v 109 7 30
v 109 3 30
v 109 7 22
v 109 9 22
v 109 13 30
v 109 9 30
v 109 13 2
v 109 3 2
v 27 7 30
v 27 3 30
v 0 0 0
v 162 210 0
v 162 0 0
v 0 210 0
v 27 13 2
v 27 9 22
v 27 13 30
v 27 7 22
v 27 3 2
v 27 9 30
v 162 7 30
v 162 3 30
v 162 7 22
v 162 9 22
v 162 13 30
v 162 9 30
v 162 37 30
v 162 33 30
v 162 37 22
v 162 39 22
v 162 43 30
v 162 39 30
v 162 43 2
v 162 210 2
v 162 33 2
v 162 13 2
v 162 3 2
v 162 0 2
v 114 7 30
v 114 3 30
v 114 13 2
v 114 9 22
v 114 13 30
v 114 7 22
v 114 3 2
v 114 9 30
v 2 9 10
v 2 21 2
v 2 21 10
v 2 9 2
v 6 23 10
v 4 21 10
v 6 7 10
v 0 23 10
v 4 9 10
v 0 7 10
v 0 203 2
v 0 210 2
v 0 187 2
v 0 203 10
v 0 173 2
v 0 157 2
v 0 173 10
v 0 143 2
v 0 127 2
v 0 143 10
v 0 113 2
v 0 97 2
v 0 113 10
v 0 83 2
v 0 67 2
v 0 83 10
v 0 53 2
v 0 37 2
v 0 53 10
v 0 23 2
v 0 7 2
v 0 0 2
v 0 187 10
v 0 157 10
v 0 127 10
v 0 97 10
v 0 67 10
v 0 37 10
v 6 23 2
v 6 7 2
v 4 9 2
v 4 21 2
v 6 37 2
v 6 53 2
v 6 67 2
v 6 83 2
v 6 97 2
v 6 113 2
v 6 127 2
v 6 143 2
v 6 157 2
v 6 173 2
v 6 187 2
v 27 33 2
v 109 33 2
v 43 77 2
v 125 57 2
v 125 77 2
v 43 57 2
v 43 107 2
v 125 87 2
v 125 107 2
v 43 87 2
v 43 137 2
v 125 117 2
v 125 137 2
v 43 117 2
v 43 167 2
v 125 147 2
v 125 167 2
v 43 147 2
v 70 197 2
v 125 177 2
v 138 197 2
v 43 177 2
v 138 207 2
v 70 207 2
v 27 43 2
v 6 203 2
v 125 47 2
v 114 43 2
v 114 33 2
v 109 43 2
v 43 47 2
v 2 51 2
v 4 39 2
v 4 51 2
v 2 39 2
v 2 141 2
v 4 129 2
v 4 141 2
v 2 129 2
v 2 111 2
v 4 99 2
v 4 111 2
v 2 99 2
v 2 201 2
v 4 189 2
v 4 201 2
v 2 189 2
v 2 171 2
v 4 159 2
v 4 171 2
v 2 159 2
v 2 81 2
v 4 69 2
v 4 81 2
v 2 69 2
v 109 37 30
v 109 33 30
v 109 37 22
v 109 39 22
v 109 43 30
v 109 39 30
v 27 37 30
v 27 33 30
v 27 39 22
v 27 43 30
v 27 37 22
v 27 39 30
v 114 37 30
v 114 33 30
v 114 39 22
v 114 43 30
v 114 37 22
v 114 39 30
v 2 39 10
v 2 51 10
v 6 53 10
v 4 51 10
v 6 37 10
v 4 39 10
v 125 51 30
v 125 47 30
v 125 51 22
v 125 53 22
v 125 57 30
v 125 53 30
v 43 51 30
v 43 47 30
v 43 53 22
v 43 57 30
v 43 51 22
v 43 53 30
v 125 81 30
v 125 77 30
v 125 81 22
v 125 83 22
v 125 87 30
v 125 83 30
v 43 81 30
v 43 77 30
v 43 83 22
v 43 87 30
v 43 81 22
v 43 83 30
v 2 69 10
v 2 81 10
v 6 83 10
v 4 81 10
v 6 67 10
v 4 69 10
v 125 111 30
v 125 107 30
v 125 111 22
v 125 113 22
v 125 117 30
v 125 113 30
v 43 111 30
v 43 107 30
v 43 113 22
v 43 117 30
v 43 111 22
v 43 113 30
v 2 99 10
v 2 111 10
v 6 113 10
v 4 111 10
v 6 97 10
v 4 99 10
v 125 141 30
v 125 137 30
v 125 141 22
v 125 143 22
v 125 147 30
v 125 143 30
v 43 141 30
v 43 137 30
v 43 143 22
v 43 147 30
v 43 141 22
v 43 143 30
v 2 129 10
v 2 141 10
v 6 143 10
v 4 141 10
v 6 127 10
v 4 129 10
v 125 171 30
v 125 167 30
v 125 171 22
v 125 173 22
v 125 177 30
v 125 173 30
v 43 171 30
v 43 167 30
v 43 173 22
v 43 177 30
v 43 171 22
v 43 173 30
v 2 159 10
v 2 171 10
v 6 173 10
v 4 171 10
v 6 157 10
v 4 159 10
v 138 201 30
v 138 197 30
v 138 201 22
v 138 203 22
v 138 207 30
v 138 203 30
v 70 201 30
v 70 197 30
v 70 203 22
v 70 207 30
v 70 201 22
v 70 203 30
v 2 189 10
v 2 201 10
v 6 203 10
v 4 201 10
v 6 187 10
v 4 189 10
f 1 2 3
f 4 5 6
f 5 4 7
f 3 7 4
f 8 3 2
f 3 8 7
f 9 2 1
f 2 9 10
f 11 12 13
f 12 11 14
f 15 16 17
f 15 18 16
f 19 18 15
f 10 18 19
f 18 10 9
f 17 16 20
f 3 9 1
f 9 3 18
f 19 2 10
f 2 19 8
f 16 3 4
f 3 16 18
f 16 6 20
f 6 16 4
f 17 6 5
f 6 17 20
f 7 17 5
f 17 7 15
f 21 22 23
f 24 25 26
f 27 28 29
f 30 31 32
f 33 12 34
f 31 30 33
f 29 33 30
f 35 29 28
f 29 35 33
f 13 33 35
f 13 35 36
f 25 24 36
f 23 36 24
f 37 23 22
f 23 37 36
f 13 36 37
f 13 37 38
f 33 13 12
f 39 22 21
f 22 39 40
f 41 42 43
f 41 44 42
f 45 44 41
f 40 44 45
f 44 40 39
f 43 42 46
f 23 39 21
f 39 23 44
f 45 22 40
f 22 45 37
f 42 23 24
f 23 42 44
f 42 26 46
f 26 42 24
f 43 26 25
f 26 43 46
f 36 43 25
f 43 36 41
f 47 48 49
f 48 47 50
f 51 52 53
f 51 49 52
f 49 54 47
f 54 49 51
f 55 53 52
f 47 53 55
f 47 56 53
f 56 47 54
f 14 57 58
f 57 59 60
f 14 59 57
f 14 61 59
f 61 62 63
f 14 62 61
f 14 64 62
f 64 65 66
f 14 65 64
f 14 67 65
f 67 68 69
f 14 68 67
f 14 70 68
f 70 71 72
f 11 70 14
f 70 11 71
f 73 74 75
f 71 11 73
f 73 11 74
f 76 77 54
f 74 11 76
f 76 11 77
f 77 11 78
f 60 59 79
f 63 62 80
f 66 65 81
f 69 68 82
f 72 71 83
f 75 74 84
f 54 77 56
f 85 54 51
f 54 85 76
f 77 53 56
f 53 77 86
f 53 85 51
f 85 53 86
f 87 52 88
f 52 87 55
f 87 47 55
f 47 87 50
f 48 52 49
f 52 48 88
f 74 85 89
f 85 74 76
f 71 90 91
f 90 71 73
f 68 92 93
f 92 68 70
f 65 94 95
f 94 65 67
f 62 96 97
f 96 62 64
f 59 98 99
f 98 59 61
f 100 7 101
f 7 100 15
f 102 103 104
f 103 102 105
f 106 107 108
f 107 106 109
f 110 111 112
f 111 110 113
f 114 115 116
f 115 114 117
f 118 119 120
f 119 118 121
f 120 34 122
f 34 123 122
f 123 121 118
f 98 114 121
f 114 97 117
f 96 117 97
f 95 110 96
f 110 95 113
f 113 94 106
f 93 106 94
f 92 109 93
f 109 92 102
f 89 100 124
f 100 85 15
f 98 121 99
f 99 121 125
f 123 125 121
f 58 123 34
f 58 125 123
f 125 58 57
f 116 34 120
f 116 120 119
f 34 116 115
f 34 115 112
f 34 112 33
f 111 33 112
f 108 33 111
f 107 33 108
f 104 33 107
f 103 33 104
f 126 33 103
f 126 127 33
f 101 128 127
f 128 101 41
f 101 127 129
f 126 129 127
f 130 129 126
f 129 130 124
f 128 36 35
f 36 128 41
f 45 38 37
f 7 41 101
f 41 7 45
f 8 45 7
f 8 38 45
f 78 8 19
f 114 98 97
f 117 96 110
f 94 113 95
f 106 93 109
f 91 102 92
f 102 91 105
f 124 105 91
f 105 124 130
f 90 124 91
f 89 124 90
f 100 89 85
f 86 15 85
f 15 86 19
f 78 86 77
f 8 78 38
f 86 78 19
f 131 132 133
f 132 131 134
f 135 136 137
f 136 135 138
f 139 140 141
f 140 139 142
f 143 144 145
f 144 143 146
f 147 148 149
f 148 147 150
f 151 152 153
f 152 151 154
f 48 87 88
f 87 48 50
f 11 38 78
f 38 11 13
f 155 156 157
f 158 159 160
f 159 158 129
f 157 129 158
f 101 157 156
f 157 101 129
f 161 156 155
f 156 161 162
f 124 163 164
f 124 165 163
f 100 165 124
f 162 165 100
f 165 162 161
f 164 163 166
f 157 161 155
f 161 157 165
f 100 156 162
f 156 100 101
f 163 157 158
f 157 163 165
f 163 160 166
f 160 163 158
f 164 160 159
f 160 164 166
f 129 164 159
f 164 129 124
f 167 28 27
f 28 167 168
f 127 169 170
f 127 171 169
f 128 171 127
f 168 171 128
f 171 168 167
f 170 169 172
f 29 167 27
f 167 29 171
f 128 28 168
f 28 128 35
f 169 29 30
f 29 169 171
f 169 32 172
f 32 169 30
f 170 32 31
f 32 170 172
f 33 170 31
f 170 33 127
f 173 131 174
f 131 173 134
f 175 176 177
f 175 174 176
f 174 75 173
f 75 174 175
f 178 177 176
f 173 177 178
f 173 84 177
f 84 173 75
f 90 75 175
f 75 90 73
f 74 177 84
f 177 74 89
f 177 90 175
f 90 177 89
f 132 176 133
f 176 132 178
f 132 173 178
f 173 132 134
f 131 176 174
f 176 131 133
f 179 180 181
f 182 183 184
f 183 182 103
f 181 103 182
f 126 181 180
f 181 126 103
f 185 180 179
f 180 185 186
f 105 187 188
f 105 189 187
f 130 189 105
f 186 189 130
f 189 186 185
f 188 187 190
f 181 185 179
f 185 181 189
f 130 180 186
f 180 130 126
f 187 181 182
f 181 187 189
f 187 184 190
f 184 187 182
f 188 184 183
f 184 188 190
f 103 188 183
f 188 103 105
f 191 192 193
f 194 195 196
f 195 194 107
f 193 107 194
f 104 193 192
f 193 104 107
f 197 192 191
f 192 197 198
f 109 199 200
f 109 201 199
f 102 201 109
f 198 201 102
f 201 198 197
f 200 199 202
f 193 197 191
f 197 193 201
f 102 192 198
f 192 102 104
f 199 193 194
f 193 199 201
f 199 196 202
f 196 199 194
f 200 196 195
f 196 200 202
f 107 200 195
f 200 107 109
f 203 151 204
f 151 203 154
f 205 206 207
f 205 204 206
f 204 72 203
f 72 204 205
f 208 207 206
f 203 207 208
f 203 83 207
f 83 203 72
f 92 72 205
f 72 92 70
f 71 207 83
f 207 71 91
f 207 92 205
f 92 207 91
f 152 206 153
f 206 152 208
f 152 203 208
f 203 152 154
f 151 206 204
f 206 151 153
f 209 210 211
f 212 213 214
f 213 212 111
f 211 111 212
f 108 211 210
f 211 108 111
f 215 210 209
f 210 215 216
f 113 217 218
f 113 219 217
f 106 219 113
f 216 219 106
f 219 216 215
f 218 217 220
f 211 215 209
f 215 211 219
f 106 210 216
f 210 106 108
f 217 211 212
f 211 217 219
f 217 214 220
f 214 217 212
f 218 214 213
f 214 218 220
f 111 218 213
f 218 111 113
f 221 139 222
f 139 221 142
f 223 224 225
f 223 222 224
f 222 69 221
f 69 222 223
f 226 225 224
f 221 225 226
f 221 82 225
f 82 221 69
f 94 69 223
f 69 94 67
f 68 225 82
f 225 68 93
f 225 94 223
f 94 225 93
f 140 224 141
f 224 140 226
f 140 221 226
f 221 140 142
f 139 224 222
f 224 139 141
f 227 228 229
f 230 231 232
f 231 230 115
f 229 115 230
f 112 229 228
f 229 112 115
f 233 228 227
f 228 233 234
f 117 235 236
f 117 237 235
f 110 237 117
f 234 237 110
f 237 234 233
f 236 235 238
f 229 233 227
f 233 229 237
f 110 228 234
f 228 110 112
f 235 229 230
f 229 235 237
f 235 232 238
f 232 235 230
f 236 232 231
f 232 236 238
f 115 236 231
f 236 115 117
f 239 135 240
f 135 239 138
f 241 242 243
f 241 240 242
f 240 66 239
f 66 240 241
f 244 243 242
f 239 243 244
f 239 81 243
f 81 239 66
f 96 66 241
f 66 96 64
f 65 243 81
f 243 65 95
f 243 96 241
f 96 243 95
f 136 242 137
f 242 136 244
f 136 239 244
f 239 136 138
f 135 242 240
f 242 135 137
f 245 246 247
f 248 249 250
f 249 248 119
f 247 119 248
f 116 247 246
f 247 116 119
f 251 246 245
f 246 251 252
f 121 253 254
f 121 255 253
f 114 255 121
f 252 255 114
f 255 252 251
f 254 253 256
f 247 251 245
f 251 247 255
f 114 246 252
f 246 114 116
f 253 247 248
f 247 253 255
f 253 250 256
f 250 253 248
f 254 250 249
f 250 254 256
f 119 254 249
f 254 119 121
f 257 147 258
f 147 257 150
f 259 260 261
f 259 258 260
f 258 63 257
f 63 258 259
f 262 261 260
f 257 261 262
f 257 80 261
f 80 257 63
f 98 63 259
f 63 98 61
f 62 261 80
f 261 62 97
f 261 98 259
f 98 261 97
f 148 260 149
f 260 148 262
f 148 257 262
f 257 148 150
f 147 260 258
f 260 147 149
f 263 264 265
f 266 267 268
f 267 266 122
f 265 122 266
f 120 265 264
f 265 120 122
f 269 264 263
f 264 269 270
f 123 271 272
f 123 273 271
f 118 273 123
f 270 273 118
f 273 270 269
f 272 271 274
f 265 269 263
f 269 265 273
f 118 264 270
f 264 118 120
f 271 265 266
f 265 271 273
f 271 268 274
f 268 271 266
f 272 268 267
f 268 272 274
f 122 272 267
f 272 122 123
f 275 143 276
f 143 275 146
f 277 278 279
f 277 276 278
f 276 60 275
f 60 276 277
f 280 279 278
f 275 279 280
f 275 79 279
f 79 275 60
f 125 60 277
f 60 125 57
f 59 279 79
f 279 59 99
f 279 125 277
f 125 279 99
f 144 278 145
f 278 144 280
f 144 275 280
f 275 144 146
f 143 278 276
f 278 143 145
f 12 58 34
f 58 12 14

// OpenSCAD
// file: ../cardshowcase.scad
module base_tarjeta(desplazamiento, posicion_tarjeta, longitud_tarjeta, altura_borde_tarjeta, altura_interior_tarjeta)
{
    color("purple") translate([ posicion_tarjeta, desplazamiento + 1, 0 ])
        cube([ longitud_tarjeta, 4, altura_borde_tarjeta + 2 ]);

    color("pink") translate([ posicion_tarjeta, desplazamiento + 5, 0 ])
        cube([ longitud_tarjeta, 2, altura_interior_tarjeta + 2 ]);

    color("purple") translate([ posicion_tarjeta, desplazamiento + 7, 0 ])
        cube([ longitud_tarjeta, 4, altura_borde_tarjeta + 2 ]);
}

module base_tarjeta_corta(desplazamiento, posicion_tarjeta, longitud_tarjeta, altura_borde_tarjeta,
                          altura_interior_tarjeta, tab_size)
{
    color("purple") translate([ posicion_tarjeta, desplazamiento + 1, 0 ])
        cube([ tab_size, 4, altura_borde_tarjeta + 2 ]);

    color("pink") translate([ posicion_tarjeta, desplazamiento + 5, 0 ])
        cube([ tab_size, 2, altura_interior_tarjeta + 2 ]);

    color("purple") translate([ posicion_tarjeta, desplazamiento + 7, 0 ])
        cube([ tab_size, 4, altura_borde_tarjeta + 2 ]);

    color("purple") translate([ longitud_tarjeta + posicion_tarjeta - tab_size, desplazamiento + 1, 0 ])
        cube([ tab_size, 4, altura_borde_tarjeta + 2 ]);

    color("pink") translate([ longitud_tarjeta + posicion_tarjeta - tab_size, desplazamiento + 5, 0 ])
        cube([ tab_size, 2, altura_interior_tarjeta + 2 ]);

    color("purple") translate([ longitud_tarjeta + posicion_tarjeta - tab_size, desplazamiento + 7, 0 ])
        cube([ tab_size, 4, altura_borde_tarjeta + 2 ]);
}

module soporte_tarjeta(tipo, size)
{
    if (tipo == "ISA8")
    {
        desplazamiento = 2;
        posicion_tarjeta = 27;
        longitud_tarjeta = 82;
        altura_borde_tarjeta = 28;
        altura_interior_tarjeta = 20;

        if (size == 0)
        {
            base_tarjeta(desplazamiento, posicion_tarjeta, longitud_tarjeta, altura_borde_tarjeta,
                         altura_interior_tarjeta);
        }
        else
        {
            base_tarjeta_corta(desplazamiento, posicion_tarjeta, longitud_tarjeta, altura_borde_tarjeta,
                               altura_interior_tarjeta, size);
        }
    }
    else if (tipo == "ISA16")
    {
        soporte_tarjeta("ISA8", size);

        desplazamiento = 2;
        posicion_tarjeta = 28 + 81 + 5;
        longitud_tarjeta = 48;
        altura_borde_tarjeta = 28;
        altura_interior_tarjeta = 20;

        if (size == 0)
        {
            base_tarjeta(desplazamiento, posicion_tarjeta, longitud_tarjeta, altura_borde_tarjeta,
                         altura_interior_tarjeta);
        }
        else
        {
            base_tarjeta_corta(desplazamiento, posicion_tarjeta, longitud_tarjeta, altura_borde_tarjeta,
                               altura_interior_tarjeta, size);
        }
    }
    else if (tipo == "VLB")
    {
        soporte_tarjeta("ISA16", size);

        desplazamiento = 2;
        posicion_tarjeta = 28 + 135 + 8;
        longitud_tarjeta = 75;
        altura_borde_tarjeta = 28;
        altura_interior_tarjeta = 20;

        if (size == 0)
        {
            base_tarjeta(desplazamiento, posicion_tarjeta, longitud_tarjeta, altura_borde_tarjeta,
                         altura_interior_tarjeta);
        }
        else
        {
            base_tarjeta_corta(desplazamiento, posicion_tarjeta, longitud_tarjeta, altura_borde_tarjeta,
                               altura_interior_tarjeta, size);
        }
    }
    else if (tipo == "PCI")
    {
        desplazamiento = 16;
        posicion_tarjeta = 43;
        longitud_tarjeta = 82;
        altura_borde_tarjeta = 28;
        altura_interior_tarjeta = 20;

        if (size == 0)
        {
            base_tarjeta(desplazamiento, posicion_tarjeta, longitud_tarjeta, altura_borde_tarjeta,
                         altura_interior_tarjeta);
        }
        else
        {
            base_tarjeta_corta(desplazamiento, posicion_tarjeta, longitud_tarjeta, altura_borde_tarjeta,
                               altura_interior_tarjeta, size);
        }
    }
    else if (tipo == "PCIe16")
    {
        desplazamiento = 16;
        posicion_tarjeta = 50;
        longitud_tarjeta = 85;
        altura_borde_tarjeta = 24;
        altura_interior_tarjeta = 16;

        if (size == 0)
        {
            base_tarjeta(desplazamiento, posicion_tarjeta, longitud_tarjeta, altura_borde_tarjeta,
                         altura_interior_tarjeta);
        }
        else
        {
            base_tarjeta_corta(desplazamiento, posicion_tarjeta, longitud_tarjeta, altura_borde_tarjeta,
                               altura_interior_tarjeta, size);
        }
    }
    else if (tipo == "PCIe8")
    {
        desplazamiento = 16;
        posicion_tarjeta = 50;
        longitud_tarjeta = 52;
        altura_borde_tarjeta = 24;
        altura_interior_tarjeta = 16;

        if (size == 0)
        {
            base_tarjeta(desplazamiento, posicion_tarjeta, longitud_tarjeta, altura_borde_tarjeta,
                         altura_interior_tarjeta);
        }
        else
        {
            base_tarjeta_corta(desplazamiento, posicion_tarjeta, longitud_tarjeta, altura_borde_tarjeta,
                               altura_interior_tarjeta, size);
        }
    }
    else if (tipo == "PCIe4")
    {
        desplazamiento = 16;
        posicion_tarjeta = 50;
        longitud_tarjeta = 35;
        altura_borde_tarjeta = 24;
        altura_interior_tarjeta = 16;

        if (size == 0)
        {
            base_tarjeta(desplazamiento, posicion_tarjeta, longitud_tarjeta, altura_borde_tarjeta,
                         altura_interior_tarjeta);
        }
        else
        {
            base_tarjeta_corta(desplazamiento, posicion_tarjeta, longitud_tarjeta, altura_borde_tarjeta,
                               altura_interior_tarjeta, size);
        }
    }
    else if (tipo == "PCIe1")
    {
        desplazamiento = 16;
        posicion_tarjeta = 50;
        longitud_tarjeta = 21;
        altura_borde_tarjeta = 24;
        altura_interior_tarjeta = 16;

        if (size == 0)
        {
            base_tarjeta(desplazamiento, posicion_tarjeta, longitud_tarjeta, altura_borde_tarjeta,
                         altura_interior_tarjeta);
        }
        else
        {
            base_tarjeta_corta(desplazamiento, posicion_tarjeta, longitud_tarjeta, altura_borde_tarjeta,
                               altura_interior_tarjeta, size);
        }
    }
    else if (tipo == "AGP")
    {
        desplazamiento = 16;
        posicion_tarjeta = 70;
        longitud_tarjeta = 68;
        altura_borde_tarjeta = 28;
        altura_interior_tarjeta = 20;

        if (size == 0)
        {
            base_tarjeta(desplazamiento, posicion_tarjeta, longitud_tarjeta, altura_borde_tarjeta,
                         altura_interior_tarjeta);
        }
        else
        {
            base_tarjeta_corta(desplazamiento, posicion_tarjeta, longitud_tarjeta, altura_borde_tarjeta,
                               altura_interior_tarjeta, size);
        }
    }
    else if (tipo == "EISA")
    {
        desplazamiento = 2;
        posicion_tarjeta = 27;
        longitud_tarjeta = 52 + 83;
        altura_borde_tarjeta = 28;
        altura_interior_tarjeta = 15;

        if (size == 0)
        {
            base_tarjeta(desplazamiento, posicion_tarjeta, longitud_tarjeta, altura_borde_tarjeta,
                         altura_interior_tarjeta);
        }
        else
        {
            base_tarjeta_corta(desplazamiento, posicion_tarjeta, longitud_tarjeta, altura_borde_tarjeta,
                               altura_interior_tarjeta, size);
        }
    }
}

module base_placa(tipo)
{
    if (tipo == "ISA8")
    {
        color("cyan") cube([ 109, 30, 2 ]);
    }
    else if (tipo == "ISA16")
    {
        color("cyan") cube([ 162, 30, 2 ]);
    }
    else if (tipo == "VLB")
    {
        color("cyan") cube([ 246, 30, 2 ]);
    }
    else if (tipo == "PCI")
    {
        color("cyan") cube([ 125, 30, 2 ]);
    }
    else if (tipo == "PCIe16")
    {
        color("cyan") cube([ 135, 30, 2 ]);
    }
    else if (tipo == "PCIe8")
    {
        color("cyan") cube([ 102, 30, 2 ]);
    }
    else if (tipo == "PCIe4")
    {
        color("cyan") cube([ 85, 30, 2 ]);
    }
    else if (tipo == "PCIe1")
    {
        color("cyan") cube([ 71, 30, 2 ]);
    }
    else if (tipo == "AGP")
    {
        color("cyan") cube([ 138, 30, 2 ]);
    }
    else if (tipo == "EISA")
    {
        color("cyan") cube([ 162, 30, 2 ]);
    }
    else if (is_num(tipo))
    {
        color("cyan") cube([ tipo, 30, 2]);
    }
}

override_base = undef;

module base(tipo)
{
    if (override_base == undef)
    {
        base_placa(tipo);
    }
    else
    {
        base_placa(override_base);
    }
}

module single_slot(tipo, position, size = 0)
{
    displacement = position * 30;

    color("red") translate([ 0, 7 + displacement, 0 ]) cube([ 2, 16, 10 ]);

    color("red") translate([ 4, 7 + displacement, 0 ]) cube([ 2, 16, 10 ]);

    color("red") translate([ 2, 7 + displacement, 0 ]) cube([ 2, 2, 10 ]);

    color("red") translate([ 2, 21 + displacement, 0 ]) cube([ 2, 2, 10 ]);

    translate([ 0, displacement, 0 ]) soporte_tarjeta(tipo, size);
    translate([ 0, displacement, 0 ]) base(tipo);
}
// main file
include <../cardshowcase.scad>

override_base = "ISA16";

single_slot("ISA16", 0);
single_slot("ISA16", 1);
single_slot("PCI", 1);
single_slot("PCI", 2);
single_slot("PCI", 3);
single_slot("PCI", 4);
single_slot("PCI", 5);
single_slot("AGP", 6);
